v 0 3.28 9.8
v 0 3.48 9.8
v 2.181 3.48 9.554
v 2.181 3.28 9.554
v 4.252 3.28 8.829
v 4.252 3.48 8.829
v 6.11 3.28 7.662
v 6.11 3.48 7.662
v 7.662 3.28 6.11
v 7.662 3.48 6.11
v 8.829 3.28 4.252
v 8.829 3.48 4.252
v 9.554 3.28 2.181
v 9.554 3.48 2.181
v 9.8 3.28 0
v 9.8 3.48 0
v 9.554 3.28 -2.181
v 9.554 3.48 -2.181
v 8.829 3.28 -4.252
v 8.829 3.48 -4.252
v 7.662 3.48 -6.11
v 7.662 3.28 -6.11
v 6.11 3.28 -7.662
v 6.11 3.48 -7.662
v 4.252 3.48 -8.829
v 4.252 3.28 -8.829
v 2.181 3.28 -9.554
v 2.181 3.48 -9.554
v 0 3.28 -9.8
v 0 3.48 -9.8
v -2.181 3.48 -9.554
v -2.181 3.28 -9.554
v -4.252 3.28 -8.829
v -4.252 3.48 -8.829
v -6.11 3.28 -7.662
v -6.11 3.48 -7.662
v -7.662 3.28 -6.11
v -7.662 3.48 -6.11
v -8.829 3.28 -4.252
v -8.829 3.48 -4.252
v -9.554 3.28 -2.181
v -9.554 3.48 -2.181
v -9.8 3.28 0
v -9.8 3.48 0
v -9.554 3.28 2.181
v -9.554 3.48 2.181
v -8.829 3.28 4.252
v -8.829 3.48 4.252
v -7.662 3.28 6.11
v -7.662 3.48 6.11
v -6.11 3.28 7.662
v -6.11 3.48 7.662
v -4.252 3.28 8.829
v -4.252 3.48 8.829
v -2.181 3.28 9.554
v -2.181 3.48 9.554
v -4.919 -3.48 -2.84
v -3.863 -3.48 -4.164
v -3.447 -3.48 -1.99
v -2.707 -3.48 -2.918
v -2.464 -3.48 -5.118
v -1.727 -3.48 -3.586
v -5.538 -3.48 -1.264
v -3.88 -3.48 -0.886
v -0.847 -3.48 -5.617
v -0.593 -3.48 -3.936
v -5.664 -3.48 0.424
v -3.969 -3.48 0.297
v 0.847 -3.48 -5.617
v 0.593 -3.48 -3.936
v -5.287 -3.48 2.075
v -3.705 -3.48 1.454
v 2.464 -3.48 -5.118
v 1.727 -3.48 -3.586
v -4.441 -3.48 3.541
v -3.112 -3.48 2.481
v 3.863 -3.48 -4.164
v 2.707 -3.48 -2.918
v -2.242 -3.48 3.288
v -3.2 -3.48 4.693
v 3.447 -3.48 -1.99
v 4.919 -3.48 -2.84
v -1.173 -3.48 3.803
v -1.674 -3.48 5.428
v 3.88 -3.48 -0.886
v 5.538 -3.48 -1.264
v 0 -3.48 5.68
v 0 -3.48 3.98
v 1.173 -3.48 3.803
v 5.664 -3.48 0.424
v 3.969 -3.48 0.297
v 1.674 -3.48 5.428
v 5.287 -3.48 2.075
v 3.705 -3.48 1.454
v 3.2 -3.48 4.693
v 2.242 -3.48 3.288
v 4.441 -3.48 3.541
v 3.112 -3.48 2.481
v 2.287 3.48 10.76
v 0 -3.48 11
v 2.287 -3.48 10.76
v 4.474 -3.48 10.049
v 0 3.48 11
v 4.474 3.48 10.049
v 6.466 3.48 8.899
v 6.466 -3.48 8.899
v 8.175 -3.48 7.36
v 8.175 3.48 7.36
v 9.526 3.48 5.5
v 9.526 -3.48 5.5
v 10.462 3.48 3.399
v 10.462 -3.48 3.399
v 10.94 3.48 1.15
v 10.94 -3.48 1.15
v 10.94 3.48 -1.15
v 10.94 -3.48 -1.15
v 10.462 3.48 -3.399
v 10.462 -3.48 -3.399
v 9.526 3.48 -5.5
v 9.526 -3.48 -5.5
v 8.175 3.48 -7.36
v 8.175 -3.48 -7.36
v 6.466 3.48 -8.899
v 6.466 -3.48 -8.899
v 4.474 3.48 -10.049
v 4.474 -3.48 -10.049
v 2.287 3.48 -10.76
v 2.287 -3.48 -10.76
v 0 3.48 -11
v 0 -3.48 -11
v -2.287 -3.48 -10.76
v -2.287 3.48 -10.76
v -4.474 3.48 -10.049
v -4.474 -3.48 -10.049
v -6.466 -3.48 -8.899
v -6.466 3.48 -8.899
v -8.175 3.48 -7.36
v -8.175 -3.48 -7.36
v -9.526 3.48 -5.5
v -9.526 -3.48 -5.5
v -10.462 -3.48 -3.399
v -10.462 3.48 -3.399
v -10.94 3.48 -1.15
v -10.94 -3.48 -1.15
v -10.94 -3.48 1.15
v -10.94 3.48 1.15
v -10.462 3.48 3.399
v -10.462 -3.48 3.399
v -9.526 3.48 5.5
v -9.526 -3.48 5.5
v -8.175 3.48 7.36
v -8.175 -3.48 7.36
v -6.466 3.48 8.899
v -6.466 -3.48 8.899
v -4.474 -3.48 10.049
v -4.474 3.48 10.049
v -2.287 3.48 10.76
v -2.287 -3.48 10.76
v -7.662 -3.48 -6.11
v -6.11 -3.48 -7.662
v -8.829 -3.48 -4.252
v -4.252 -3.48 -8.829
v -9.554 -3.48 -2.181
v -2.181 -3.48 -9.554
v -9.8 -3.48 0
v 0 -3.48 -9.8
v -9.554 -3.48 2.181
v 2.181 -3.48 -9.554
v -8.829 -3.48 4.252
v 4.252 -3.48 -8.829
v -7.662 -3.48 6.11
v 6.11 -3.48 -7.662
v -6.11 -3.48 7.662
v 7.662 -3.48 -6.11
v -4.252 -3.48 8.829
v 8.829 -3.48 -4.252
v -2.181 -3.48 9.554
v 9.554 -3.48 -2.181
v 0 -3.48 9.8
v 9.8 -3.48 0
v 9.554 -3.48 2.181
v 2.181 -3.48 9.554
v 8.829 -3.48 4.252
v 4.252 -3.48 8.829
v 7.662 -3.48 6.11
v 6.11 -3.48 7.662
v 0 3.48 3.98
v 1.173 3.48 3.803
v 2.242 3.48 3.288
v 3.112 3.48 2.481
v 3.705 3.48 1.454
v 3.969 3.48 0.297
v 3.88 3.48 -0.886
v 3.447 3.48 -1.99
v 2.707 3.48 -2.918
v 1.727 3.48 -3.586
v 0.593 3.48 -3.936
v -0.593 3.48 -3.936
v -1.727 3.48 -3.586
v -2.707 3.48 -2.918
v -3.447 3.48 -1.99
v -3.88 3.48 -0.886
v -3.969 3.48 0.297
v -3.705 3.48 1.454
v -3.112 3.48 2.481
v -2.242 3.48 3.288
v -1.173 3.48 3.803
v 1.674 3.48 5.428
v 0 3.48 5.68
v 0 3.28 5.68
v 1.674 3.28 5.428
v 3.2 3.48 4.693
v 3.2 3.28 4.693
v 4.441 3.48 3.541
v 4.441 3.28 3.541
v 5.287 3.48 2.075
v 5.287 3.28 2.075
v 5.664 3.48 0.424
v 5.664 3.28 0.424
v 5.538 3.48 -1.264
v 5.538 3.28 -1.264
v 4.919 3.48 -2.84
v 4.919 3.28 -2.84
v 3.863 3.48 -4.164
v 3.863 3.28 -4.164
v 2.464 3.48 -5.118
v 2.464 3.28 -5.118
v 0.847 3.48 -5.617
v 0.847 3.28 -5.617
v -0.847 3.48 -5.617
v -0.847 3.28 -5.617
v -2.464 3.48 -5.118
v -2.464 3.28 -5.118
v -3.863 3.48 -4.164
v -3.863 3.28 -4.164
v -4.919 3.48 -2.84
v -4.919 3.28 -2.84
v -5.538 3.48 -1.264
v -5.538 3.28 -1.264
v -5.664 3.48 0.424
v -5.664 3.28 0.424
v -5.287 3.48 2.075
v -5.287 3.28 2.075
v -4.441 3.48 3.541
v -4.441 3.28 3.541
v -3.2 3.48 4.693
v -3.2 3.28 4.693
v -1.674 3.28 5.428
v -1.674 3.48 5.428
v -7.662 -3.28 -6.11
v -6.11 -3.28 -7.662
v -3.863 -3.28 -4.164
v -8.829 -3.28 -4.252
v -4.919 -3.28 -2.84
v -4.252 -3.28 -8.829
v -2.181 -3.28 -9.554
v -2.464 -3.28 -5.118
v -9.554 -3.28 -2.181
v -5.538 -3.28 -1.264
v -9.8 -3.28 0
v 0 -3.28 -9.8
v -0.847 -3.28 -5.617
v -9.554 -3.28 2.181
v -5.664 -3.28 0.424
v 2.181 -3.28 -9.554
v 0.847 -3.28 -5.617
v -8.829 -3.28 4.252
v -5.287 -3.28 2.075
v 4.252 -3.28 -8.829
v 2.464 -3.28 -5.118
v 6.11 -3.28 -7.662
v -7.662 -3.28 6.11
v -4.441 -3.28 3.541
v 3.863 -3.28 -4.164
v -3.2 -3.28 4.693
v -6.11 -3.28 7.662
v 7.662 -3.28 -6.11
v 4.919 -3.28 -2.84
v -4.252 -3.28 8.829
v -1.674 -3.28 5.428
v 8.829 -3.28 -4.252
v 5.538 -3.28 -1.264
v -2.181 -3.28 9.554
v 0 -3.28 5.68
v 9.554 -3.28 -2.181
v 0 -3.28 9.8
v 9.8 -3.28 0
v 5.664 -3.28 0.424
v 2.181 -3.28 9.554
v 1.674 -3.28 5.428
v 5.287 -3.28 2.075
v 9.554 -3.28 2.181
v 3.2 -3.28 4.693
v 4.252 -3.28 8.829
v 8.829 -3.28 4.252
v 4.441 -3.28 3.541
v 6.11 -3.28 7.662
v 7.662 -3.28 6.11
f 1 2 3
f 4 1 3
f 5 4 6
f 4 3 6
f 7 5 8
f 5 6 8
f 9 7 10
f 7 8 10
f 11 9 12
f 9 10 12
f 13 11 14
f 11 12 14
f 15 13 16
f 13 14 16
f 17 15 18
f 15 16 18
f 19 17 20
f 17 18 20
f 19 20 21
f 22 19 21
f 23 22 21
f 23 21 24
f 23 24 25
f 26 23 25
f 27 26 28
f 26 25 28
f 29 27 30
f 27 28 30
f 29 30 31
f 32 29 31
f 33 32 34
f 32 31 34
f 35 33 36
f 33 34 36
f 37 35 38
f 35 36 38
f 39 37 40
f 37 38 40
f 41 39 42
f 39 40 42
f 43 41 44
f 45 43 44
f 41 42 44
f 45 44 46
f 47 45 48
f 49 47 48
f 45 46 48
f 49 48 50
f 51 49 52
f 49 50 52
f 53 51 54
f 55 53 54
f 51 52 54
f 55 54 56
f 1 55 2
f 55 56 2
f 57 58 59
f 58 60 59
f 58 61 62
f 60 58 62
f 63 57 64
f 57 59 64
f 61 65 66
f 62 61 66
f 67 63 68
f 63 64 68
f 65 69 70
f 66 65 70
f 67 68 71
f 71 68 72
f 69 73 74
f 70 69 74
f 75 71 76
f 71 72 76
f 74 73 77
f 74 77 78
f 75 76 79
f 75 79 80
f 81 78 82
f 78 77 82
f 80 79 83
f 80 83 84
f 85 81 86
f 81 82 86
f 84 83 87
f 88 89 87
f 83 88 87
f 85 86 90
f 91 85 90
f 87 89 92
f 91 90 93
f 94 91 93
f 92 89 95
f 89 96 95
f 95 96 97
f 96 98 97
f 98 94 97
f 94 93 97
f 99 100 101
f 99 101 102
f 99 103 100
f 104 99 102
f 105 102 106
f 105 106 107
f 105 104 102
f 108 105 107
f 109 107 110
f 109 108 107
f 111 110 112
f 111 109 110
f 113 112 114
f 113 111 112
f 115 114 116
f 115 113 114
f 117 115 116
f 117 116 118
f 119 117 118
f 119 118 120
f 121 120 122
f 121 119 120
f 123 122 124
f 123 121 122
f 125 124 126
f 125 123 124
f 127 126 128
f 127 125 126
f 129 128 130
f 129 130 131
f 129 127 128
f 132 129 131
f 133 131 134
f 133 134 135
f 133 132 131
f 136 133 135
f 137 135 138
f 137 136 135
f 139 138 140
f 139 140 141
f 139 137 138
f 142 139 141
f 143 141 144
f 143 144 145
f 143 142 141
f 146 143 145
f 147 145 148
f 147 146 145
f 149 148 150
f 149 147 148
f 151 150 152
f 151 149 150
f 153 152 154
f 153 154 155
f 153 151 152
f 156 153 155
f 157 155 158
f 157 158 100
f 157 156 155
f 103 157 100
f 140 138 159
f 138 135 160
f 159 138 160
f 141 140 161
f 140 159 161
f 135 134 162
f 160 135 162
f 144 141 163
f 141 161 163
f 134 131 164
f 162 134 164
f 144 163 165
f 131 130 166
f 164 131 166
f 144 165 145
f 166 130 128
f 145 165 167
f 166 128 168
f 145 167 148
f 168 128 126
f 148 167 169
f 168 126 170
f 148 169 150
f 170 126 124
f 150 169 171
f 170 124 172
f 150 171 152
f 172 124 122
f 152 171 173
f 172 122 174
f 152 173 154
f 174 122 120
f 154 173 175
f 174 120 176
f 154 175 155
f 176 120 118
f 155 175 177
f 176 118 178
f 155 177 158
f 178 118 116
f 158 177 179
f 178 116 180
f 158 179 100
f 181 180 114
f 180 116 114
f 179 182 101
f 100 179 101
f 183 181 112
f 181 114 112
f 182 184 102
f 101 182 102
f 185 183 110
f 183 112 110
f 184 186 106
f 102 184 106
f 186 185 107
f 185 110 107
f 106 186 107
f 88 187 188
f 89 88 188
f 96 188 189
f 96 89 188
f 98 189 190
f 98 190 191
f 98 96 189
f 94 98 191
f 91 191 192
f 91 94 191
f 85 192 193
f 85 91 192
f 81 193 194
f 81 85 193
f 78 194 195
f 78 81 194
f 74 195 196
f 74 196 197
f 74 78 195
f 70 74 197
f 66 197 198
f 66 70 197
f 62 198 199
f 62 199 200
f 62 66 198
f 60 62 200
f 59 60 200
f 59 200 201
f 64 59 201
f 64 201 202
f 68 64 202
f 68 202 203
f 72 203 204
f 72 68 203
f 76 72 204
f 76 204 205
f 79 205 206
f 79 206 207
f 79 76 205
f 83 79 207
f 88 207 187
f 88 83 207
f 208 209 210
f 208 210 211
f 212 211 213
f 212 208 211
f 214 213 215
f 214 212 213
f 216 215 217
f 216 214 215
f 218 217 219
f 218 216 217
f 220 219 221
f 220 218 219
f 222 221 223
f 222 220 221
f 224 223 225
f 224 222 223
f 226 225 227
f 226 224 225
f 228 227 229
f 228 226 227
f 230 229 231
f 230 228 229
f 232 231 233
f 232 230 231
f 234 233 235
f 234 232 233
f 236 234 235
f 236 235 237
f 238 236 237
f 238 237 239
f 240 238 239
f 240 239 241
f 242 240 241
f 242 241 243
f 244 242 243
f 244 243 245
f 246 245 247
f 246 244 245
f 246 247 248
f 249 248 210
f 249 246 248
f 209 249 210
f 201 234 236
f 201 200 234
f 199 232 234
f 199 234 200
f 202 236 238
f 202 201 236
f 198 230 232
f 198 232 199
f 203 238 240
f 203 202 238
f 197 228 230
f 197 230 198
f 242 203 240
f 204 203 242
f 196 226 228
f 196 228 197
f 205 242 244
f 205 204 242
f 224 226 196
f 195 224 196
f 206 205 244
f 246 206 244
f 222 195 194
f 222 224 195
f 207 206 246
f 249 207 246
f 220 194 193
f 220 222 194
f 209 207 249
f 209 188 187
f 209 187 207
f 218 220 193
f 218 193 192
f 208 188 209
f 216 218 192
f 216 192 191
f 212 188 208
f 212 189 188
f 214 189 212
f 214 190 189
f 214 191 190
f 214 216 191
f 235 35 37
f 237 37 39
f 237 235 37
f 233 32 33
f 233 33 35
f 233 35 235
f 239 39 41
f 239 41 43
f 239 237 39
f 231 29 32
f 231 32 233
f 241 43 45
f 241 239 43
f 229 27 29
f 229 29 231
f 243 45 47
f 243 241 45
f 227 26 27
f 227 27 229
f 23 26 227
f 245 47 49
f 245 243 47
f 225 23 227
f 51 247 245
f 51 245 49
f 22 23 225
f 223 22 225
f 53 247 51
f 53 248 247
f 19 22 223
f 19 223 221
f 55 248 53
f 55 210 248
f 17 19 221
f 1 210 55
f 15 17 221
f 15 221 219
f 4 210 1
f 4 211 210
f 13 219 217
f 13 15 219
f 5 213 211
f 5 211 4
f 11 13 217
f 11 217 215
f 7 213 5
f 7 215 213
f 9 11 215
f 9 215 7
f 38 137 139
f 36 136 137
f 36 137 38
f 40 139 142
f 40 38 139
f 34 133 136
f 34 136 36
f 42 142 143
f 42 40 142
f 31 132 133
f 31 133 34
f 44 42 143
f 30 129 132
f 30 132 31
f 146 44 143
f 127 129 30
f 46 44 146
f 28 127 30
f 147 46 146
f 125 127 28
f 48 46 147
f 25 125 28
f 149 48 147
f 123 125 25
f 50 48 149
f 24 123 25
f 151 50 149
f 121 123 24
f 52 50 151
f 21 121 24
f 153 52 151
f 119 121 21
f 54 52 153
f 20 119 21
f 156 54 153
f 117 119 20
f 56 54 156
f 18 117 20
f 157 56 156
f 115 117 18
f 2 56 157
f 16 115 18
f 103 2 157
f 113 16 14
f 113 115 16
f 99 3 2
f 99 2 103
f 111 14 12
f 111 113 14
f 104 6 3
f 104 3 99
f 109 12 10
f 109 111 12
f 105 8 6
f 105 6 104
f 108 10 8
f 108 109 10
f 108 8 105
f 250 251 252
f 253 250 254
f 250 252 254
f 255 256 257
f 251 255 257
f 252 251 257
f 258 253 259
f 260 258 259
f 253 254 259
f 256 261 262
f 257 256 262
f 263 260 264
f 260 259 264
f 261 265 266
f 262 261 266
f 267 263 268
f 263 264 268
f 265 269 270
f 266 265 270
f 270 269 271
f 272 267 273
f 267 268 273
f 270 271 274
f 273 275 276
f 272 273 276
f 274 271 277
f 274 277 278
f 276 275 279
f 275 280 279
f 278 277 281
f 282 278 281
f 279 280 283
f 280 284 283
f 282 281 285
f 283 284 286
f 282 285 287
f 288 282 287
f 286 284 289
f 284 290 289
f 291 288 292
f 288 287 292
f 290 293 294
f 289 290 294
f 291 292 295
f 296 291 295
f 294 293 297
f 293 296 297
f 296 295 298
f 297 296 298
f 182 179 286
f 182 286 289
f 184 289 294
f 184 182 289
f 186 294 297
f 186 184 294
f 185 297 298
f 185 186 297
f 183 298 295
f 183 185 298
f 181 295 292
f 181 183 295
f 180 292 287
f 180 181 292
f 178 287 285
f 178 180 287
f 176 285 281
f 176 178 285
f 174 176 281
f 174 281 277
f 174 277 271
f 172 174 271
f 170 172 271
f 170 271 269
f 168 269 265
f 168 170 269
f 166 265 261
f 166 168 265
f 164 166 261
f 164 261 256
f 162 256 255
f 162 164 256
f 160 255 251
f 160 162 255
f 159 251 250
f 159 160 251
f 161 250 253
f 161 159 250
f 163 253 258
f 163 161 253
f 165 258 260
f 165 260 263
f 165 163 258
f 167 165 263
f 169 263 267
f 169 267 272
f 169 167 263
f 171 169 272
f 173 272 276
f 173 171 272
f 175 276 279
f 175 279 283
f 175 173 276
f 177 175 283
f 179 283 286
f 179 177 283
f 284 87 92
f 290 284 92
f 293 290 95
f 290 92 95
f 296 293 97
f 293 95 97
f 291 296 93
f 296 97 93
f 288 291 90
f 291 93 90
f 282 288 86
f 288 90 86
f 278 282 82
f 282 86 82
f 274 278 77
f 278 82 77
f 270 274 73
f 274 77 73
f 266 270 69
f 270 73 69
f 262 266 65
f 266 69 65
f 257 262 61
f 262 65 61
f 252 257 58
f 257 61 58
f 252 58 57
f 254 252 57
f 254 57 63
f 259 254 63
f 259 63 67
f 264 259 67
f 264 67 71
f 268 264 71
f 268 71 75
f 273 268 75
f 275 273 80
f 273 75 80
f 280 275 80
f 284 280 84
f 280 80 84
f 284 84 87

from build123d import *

# Parameters (mm, degrees)
SKETCH3_R           = 11
SKETCH3_R_2         = 3.98
BOSS_EXTRUDE1_DEPTH = 3.48
SKETCH4_R           = 9.8
SKETCH4_R_2         = 5.68
CUT_EXTRUDE1_DEPTH  = 0.2


with BuildPart() as part:
    # Sketch3 → Boss-Extrude1 (new, symmetric)
    with BuildSketch(Plane(origin=(0, 0, 0), x_dir=(1, 0, 0), z_dir=(0, 1, 0))):
        with Locations(Location((0, 0, 0), (0, 0, 270))):
            Circle(SKETCH3_R)
        with Locations(Location((0, 0, 0), (0, 0, 270))):
            Circle(SKETCH3_R_2, mode=Mode.SUBTRACT)
    extrude(amount=BOSS_EXTRUDE1_DEPTH, both=True)

    # Sketch4 → Cut-Extrude1 (cut)
    with BuildSketch(Plane(origin=(0, 3.48, 0), x_dir=(1, 0, 0), z_dir=(0, 1, 0))):
        with Locations(Location((0, 0, 0), (0, 0, 270))):
            Circle(SKETCH4_R)
        with Locations(Location((0, 0, 0), (0, 0, 270))):
            Circle(SKETCH4_R_2, mode=Mode.SUBTRACT)
    cut_extrude1 = extrude(amount=-CUT_EXTRUDE1_DEPTH, mode=Mode.SUBTRACT)

    # Mirror1: Cut-Extrude1 across plane
    add(cut_extrude1.mirror(Plane.ZX), mode=Mode.SUBTRACT)


solid = part.part
